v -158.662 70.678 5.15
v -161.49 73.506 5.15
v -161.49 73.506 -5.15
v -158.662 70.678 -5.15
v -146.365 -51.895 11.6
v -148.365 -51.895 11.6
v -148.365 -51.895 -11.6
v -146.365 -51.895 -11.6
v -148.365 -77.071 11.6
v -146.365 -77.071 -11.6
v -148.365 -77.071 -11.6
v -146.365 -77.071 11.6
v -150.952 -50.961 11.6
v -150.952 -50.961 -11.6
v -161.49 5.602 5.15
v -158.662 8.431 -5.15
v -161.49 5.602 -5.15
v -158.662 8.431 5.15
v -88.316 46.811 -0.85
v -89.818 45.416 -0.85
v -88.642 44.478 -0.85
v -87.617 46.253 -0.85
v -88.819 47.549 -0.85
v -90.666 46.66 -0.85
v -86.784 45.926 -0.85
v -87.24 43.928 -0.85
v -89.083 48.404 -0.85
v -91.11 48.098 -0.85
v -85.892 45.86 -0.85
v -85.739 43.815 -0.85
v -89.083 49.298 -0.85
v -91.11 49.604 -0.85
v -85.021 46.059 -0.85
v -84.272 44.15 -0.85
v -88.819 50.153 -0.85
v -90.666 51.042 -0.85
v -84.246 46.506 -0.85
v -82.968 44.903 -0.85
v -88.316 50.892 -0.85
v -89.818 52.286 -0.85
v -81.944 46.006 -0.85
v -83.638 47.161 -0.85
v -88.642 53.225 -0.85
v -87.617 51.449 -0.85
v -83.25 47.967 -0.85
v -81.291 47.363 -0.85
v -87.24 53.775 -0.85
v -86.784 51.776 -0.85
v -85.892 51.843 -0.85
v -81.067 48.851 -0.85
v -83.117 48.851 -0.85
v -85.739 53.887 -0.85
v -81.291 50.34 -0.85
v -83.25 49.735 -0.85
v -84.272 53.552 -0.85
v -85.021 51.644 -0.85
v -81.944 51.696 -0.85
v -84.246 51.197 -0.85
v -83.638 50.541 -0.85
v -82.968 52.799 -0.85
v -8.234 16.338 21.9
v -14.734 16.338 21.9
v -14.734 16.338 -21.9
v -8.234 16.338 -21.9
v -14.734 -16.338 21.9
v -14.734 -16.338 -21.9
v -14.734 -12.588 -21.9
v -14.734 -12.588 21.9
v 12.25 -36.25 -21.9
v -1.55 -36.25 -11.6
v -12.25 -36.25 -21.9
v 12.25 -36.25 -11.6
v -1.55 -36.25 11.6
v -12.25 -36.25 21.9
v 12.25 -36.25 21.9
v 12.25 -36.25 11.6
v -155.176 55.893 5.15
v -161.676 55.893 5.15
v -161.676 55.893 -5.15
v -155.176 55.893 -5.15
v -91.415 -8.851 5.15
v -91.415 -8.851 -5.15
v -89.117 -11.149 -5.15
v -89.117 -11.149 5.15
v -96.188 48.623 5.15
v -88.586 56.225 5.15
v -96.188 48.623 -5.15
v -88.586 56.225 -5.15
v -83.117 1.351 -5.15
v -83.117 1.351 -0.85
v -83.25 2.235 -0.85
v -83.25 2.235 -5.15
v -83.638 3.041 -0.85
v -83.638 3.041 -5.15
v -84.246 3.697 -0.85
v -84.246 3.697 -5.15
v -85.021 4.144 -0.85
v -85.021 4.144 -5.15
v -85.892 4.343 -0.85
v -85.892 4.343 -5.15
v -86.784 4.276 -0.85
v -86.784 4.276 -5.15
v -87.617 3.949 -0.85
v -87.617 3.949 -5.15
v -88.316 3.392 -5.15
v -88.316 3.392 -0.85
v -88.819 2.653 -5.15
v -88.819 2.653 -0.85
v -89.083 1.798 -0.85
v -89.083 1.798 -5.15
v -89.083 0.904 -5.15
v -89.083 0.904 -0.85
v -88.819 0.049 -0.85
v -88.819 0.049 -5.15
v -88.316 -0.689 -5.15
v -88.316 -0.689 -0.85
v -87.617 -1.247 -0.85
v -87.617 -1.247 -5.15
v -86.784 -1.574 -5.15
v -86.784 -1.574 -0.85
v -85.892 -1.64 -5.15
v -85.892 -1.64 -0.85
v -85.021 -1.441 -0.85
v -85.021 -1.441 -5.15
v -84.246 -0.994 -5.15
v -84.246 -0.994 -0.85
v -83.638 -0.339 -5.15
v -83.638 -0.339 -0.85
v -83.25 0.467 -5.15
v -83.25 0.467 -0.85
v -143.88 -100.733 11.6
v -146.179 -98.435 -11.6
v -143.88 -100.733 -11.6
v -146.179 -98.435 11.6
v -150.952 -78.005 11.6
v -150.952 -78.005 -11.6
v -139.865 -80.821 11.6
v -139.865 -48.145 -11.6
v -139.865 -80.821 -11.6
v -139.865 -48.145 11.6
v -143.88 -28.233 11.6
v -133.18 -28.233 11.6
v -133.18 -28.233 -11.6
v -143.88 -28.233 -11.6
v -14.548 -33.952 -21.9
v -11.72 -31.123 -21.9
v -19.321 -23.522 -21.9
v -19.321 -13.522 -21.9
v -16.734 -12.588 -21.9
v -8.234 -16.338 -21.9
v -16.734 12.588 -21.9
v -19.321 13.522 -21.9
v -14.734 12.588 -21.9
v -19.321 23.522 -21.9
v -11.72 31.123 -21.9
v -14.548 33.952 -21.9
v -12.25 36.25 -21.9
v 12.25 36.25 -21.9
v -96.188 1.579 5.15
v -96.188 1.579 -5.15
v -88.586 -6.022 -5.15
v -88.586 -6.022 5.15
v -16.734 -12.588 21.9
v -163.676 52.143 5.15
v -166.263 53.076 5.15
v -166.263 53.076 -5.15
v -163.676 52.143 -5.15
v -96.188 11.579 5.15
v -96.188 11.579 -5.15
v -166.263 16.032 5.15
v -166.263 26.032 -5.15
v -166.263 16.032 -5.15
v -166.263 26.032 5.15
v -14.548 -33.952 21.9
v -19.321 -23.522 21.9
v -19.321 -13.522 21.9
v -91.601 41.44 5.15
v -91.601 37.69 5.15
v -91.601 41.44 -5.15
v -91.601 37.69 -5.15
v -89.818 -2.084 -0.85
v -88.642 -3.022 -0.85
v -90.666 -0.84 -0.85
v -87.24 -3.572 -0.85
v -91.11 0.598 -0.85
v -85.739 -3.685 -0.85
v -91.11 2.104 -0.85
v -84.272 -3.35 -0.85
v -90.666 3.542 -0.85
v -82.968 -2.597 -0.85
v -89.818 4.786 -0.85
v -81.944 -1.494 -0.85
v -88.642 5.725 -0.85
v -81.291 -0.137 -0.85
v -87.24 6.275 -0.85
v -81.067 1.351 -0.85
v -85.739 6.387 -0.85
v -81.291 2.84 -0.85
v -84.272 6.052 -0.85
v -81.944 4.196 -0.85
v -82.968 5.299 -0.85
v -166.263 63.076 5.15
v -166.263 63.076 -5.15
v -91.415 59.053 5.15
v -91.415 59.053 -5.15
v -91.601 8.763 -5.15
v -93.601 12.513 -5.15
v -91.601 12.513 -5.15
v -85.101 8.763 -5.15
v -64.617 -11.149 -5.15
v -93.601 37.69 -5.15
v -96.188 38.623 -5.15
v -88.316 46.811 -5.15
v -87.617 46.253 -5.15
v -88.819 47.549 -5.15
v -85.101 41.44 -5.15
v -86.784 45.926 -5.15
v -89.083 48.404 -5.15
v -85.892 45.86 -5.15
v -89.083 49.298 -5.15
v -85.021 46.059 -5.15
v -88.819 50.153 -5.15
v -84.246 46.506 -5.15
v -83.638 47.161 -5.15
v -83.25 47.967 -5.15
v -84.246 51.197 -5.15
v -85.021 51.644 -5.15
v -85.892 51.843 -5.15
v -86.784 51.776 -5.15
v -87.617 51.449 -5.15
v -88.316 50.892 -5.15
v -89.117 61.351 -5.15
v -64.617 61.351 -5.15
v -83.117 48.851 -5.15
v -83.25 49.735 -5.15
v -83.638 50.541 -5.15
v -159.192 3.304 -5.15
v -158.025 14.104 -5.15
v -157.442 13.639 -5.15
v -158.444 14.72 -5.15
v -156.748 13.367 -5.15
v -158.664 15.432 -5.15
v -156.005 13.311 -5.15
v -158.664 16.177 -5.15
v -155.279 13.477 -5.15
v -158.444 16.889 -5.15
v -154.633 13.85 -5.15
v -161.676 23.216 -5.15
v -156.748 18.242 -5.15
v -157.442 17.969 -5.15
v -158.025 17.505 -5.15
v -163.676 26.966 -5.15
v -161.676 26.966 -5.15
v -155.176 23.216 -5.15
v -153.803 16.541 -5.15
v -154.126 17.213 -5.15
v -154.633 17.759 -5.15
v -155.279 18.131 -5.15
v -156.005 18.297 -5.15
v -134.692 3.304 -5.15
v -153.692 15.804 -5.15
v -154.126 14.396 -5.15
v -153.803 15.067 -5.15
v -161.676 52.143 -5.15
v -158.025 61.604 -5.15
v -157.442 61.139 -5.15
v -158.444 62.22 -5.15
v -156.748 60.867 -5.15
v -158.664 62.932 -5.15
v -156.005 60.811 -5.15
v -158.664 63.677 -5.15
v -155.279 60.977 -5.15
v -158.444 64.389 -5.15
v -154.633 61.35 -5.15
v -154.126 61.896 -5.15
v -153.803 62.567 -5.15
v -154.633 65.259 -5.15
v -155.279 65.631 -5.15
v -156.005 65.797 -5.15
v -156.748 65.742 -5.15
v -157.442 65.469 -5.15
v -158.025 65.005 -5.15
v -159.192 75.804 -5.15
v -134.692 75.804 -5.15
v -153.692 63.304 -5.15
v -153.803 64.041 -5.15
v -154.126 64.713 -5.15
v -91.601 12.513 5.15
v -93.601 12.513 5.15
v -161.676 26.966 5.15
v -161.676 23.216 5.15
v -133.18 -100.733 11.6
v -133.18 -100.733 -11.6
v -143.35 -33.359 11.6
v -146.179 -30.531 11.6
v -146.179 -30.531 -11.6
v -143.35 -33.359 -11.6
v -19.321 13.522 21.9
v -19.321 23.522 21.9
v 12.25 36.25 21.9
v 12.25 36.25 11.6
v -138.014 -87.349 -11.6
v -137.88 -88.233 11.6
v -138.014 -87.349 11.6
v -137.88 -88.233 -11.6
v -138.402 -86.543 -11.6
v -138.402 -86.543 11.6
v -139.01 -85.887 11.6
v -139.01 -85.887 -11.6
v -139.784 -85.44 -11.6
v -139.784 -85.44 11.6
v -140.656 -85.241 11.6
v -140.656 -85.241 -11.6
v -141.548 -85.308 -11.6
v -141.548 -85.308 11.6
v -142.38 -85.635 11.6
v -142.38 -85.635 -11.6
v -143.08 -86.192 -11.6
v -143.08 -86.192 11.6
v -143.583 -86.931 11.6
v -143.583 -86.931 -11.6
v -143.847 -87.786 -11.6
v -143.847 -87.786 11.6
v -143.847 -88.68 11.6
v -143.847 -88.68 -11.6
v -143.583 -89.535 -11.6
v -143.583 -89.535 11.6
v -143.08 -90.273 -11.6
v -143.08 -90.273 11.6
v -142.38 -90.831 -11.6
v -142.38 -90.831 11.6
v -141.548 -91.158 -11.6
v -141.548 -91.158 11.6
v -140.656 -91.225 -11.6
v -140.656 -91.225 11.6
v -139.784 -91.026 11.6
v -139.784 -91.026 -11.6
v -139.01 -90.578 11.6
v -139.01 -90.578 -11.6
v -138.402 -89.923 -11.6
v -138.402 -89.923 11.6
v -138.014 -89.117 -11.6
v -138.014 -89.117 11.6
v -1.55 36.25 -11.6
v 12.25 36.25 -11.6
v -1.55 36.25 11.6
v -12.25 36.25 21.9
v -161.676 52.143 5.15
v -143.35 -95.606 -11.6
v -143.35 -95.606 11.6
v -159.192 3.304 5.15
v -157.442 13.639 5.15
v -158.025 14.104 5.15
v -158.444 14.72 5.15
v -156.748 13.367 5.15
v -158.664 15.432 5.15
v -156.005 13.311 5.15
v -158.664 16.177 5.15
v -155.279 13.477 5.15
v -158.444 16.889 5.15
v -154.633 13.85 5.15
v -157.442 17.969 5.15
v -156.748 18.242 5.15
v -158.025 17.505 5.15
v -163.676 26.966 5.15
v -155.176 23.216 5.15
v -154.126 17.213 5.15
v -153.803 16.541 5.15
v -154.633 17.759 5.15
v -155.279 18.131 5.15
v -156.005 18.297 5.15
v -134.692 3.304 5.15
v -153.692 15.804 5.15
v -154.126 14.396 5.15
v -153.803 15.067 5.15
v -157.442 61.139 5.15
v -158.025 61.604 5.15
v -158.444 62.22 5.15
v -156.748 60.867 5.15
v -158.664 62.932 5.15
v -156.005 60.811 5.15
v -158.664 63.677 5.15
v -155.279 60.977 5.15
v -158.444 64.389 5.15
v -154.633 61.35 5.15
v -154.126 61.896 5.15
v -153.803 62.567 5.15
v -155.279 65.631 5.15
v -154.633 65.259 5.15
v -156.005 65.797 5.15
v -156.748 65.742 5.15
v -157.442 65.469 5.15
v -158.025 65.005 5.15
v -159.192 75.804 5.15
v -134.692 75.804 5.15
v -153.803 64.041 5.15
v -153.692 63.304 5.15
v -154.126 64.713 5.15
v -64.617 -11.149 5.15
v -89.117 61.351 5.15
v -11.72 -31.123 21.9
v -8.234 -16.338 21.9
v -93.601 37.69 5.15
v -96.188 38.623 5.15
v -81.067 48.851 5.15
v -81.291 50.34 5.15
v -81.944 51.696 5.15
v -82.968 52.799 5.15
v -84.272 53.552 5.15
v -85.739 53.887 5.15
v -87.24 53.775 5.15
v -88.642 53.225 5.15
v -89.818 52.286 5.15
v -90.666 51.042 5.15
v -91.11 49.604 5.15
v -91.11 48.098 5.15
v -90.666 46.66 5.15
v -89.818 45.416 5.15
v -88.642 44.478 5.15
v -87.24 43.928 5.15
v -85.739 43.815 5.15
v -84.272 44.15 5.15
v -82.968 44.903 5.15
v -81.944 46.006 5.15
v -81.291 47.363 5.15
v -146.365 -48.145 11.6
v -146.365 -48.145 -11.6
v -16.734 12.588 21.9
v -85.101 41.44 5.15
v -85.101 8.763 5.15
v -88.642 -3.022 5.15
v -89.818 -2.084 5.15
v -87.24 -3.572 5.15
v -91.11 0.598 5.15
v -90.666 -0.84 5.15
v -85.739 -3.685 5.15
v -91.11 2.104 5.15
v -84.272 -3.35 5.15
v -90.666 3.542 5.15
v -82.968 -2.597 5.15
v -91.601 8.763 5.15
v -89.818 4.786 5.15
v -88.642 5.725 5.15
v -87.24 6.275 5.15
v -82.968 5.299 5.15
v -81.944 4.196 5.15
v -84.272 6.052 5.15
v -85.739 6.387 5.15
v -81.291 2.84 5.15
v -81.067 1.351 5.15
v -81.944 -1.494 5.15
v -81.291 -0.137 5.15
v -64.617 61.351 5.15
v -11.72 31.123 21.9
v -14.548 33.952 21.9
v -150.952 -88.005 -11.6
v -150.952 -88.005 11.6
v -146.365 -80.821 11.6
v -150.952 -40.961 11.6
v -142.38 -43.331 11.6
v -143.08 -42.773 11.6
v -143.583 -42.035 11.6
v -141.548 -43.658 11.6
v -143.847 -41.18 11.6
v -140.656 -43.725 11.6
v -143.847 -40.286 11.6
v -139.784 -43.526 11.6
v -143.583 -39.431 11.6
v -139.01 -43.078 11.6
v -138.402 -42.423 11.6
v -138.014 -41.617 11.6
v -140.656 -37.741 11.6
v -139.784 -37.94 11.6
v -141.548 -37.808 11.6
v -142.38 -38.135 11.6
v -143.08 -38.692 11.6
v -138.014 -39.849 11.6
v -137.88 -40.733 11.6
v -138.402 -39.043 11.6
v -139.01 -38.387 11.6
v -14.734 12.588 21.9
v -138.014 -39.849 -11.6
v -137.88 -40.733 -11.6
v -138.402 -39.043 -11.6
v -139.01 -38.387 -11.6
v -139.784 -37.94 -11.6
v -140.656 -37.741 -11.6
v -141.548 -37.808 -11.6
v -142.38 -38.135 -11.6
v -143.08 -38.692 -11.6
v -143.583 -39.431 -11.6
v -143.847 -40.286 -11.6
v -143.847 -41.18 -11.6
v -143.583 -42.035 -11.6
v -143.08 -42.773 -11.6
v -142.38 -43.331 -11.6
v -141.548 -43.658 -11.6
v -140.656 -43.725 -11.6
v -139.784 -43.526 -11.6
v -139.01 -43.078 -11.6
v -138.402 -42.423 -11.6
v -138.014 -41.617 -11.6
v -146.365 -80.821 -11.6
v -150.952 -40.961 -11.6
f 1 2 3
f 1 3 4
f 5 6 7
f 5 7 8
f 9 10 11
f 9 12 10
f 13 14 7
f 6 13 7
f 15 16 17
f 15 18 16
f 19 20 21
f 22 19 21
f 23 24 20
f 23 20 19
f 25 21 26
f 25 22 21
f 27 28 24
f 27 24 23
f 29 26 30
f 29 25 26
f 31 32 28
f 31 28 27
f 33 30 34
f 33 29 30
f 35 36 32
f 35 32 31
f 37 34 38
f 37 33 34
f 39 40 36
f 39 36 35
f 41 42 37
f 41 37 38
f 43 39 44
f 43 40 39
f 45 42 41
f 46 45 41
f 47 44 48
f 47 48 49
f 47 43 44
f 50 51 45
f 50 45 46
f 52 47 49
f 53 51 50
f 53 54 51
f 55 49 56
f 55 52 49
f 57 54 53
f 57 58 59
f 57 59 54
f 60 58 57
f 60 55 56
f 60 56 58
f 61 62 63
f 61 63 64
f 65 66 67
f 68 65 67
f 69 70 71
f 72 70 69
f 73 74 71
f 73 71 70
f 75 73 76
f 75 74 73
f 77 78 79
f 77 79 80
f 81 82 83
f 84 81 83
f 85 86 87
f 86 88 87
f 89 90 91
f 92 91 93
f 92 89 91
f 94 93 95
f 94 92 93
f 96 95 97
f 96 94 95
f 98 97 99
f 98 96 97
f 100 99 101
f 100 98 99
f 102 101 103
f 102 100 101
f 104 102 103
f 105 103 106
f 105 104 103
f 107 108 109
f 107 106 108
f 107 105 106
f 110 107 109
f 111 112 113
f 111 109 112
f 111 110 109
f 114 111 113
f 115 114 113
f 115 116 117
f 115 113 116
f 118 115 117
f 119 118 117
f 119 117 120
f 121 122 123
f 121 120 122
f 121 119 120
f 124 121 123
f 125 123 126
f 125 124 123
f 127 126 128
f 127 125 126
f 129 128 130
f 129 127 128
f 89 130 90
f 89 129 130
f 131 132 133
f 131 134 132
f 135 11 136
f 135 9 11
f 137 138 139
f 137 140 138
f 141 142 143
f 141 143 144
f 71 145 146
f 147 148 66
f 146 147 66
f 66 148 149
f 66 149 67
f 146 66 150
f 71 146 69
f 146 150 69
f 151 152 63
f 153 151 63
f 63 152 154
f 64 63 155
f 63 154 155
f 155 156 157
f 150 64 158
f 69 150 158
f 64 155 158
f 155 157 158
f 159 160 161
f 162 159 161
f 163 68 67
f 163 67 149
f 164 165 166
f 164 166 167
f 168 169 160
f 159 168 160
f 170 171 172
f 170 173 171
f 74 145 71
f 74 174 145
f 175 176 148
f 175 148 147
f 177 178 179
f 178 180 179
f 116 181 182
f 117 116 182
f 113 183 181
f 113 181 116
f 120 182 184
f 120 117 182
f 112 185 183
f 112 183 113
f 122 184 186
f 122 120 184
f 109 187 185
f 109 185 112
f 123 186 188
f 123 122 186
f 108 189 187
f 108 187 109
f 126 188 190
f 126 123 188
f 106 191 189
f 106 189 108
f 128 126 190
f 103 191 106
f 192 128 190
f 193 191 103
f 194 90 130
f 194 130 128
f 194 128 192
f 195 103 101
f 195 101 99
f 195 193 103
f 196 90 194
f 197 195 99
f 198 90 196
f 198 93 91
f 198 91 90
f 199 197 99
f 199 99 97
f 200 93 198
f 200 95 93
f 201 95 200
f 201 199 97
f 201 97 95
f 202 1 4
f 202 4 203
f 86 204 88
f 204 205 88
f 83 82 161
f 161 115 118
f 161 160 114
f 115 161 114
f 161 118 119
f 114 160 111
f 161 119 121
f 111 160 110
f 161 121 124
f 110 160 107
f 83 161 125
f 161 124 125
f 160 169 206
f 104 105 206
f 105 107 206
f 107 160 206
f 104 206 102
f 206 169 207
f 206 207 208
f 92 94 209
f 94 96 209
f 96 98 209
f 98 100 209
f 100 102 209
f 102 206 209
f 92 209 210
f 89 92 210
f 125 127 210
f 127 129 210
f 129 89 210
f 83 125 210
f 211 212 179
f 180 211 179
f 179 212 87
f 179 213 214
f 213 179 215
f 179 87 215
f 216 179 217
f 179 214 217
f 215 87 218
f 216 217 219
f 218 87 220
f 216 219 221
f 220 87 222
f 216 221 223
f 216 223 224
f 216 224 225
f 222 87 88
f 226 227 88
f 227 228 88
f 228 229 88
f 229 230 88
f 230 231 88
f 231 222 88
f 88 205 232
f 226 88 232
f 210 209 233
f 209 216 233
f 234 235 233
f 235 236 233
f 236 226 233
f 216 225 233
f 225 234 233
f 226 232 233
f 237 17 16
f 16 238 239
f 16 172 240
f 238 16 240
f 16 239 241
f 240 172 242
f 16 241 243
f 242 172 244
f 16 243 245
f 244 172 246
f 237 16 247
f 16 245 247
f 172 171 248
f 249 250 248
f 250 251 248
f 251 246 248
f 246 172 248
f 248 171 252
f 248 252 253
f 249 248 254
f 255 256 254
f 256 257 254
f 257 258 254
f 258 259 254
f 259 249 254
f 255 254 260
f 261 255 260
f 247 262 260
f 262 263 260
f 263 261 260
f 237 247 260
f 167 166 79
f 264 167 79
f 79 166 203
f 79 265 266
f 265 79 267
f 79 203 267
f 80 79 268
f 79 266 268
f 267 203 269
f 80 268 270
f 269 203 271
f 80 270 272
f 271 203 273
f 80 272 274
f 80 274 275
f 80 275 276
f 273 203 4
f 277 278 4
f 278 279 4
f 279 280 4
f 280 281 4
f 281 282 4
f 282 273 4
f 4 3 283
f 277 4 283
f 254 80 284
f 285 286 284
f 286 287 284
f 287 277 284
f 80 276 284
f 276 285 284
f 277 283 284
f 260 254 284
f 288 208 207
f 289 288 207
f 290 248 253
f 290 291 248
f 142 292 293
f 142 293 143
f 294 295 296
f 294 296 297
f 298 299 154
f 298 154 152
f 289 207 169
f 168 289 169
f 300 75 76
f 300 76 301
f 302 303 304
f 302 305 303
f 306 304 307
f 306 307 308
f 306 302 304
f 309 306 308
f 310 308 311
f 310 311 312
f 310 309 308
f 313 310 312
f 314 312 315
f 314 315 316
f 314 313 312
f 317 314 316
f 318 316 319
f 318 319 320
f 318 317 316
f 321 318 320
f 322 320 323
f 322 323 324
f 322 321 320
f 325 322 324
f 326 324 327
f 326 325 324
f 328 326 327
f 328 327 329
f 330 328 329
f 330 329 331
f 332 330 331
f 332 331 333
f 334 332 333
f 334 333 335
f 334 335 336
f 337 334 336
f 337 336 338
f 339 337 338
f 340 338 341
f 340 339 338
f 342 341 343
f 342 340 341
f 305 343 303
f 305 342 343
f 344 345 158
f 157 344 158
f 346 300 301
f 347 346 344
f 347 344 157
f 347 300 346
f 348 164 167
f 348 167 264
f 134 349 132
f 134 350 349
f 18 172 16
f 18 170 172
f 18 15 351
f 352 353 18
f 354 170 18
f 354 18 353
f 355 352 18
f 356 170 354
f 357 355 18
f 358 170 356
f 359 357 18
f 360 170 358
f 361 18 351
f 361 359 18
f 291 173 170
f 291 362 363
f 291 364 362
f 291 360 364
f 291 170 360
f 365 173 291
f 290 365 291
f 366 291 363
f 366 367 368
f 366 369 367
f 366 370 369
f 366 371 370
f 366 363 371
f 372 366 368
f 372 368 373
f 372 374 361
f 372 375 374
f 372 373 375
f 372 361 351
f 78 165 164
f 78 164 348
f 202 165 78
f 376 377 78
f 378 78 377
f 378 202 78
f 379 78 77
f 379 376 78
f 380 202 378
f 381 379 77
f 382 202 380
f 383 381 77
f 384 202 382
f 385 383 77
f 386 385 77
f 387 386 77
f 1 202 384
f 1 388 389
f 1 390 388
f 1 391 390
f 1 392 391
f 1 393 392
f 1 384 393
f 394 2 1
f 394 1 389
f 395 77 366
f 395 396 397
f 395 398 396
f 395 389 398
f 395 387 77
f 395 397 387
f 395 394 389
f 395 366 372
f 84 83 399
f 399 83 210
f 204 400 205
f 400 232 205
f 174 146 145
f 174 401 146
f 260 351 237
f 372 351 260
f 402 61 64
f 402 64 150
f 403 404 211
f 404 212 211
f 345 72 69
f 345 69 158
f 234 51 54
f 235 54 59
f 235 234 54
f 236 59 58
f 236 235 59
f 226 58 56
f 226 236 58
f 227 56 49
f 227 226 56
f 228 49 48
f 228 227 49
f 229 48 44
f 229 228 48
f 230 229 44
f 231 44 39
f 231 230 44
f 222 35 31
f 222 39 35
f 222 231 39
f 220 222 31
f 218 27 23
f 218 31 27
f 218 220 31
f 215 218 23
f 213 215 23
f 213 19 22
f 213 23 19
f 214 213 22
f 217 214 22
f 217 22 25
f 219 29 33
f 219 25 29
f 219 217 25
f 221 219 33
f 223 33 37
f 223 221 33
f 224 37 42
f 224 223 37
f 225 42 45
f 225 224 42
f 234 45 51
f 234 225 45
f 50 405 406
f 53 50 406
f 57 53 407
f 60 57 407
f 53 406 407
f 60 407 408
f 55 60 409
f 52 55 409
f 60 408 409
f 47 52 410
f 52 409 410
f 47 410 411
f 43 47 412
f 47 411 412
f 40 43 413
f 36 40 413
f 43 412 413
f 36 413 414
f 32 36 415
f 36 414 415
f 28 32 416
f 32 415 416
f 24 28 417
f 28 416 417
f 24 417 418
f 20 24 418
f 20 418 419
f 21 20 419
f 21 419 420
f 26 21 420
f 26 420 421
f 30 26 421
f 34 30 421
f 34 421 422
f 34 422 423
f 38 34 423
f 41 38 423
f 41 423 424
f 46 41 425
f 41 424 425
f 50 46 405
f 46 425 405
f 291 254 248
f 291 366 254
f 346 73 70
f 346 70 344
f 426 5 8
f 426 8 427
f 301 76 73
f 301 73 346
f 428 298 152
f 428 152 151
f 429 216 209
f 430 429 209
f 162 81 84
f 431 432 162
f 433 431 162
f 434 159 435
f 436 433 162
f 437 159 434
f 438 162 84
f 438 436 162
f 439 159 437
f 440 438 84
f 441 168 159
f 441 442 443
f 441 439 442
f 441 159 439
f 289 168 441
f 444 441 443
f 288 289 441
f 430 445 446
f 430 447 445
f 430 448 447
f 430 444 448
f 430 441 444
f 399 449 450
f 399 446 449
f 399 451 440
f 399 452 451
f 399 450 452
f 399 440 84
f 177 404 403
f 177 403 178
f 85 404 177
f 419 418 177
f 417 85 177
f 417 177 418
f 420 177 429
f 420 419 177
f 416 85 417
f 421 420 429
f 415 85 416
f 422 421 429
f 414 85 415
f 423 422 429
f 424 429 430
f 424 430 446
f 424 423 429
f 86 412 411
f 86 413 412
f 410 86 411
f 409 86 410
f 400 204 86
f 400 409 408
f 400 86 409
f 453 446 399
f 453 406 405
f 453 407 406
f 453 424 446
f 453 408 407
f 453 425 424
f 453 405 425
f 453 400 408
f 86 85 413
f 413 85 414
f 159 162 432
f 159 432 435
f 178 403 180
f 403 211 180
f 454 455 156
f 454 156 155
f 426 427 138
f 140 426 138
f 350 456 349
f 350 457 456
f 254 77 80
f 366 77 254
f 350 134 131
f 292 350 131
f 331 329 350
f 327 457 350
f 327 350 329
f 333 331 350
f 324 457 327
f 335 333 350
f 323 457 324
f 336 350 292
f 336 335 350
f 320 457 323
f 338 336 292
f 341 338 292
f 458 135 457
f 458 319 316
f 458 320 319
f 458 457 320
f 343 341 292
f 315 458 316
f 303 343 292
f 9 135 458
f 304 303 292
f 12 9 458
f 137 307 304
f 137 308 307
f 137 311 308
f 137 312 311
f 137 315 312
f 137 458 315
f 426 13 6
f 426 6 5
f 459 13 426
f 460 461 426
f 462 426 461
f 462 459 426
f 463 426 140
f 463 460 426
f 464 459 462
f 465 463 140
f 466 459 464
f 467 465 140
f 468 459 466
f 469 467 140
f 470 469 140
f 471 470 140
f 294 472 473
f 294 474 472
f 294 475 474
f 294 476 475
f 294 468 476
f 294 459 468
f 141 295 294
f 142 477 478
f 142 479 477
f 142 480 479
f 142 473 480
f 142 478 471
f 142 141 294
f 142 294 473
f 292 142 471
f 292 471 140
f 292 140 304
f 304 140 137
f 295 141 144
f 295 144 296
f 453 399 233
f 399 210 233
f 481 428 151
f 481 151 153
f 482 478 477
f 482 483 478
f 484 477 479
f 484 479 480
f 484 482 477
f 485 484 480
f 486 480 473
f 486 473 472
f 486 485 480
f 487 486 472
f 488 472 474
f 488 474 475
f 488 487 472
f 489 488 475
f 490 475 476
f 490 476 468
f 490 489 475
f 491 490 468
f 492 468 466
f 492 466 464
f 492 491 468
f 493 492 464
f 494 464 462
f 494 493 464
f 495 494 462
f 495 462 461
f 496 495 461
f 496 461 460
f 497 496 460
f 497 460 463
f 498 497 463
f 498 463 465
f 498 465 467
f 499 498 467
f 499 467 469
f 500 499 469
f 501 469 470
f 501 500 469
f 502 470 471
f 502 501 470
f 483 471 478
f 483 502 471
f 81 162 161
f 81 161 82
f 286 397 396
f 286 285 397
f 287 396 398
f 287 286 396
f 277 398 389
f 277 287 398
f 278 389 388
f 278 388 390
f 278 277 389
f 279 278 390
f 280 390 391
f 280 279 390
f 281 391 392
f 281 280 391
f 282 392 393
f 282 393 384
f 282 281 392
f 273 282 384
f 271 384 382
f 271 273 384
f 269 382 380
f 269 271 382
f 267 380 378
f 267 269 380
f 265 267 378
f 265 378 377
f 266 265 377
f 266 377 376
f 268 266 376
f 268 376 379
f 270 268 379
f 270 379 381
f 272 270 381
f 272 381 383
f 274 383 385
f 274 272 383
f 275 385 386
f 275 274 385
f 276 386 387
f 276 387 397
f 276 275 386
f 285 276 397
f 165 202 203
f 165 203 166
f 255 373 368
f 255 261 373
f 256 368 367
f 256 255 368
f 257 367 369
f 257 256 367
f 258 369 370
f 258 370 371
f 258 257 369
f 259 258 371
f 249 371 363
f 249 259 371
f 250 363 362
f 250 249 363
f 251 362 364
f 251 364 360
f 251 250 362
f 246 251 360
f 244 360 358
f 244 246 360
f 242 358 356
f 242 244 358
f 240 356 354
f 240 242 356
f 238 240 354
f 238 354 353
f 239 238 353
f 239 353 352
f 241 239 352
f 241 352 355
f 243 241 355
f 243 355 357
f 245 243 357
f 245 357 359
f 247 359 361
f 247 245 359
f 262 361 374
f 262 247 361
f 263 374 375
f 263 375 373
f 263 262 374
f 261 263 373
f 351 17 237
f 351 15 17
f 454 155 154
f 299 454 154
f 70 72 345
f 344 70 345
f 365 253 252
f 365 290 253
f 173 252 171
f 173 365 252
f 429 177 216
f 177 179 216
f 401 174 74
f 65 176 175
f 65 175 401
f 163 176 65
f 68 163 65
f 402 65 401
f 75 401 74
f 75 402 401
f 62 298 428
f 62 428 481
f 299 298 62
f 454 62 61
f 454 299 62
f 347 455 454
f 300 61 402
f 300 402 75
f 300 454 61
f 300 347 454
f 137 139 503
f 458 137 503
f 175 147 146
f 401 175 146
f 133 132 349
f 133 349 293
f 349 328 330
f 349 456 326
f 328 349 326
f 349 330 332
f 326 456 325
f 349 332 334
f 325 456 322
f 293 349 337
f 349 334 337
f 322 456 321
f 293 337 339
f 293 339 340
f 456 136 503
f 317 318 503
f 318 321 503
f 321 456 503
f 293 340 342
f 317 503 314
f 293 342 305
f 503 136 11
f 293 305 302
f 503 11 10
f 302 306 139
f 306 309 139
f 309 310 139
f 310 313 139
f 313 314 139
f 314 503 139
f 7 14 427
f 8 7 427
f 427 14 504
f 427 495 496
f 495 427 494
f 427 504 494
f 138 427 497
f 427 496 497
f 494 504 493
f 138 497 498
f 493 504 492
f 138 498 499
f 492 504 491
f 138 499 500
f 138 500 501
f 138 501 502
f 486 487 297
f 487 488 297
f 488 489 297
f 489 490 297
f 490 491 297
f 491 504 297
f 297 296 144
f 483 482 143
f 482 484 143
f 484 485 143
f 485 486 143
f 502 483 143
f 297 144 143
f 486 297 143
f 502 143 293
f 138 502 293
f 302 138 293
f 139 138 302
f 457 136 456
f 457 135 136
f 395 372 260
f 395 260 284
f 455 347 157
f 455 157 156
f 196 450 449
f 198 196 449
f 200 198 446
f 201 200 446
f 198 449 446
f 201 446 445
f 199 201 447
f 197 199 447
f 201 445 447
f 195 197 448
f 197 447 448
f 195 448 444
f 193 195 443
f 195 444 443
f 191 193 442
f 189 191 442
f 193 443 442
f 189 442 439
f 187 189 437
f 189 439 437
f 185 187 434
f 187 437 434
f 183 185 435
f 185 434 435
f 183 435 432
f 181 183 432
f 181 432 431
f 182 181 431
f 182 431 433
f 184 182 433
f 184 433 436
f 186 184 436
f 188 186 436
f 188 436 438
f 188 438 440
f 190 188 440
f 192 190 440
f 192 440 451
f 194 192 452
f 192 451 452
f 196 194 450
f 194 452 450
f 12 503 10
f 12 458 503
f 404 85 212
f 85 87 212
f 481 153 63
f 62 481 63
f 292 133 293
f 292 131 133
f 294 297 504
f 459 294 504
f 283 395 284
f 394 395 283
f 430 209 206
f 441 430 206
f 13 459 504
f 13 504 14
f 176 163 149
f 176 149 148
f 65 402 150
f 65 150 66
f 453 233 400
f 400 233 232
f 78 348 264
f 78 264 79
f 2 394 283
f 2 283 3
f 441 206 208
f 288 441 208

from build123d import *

# Parameters (mm, degrees)
F1_DEPTH = 21.9
F2_W     = 72.5
F2_H     = 23.2
F3_DEPTH = 13.8
F4_R     = 3
F4_R_2   = 2.5
F5_DEPTH = 5.15
F6_R     = 3
F7_DEPTH = 11.6
F8_R     = 5.05
F9_DEPTH = 6


with BuildPart() as f1:
    # F0 (on Top) → F1 (new body, symmetric)
    with BuildSketch(Plane.XY):
        Polygon((-12.25, -36.25), (12.25, -36.25), (12.25, 36.25), (-12.25, 36.25), (-14.548097, 33.951903), (-11.71967, 31.123476), (-19.321068, 23.522078), (-19.321068, 13.522078), (-16.734427, 12.588382), (-14.734427, 12.588382), (-14.734427, 13.322519), (-14.734427, 16.338382), (-8.234427, 16.338382), (-8.234427, 0), (-8.234427, -16.338382), (-14.734427, -16.338382), (-14.734427, -13.322519), (-14.734427, -12.588382), (-16.734427, -12.588382), (-19.321068, -13.522078), (-19.321068, -23.522078), (-11.71967, -31.123476), (-14.548097, -33.951903), align=None)
    extrude(amount=F1_DEPTH, both=True)

    # F2 (on face) → F3 (cut)
    with BuildSketch(Plane.YZ.offset(12.25)):
        Rectangle(F2_W, F2_H)
    extrude(amount=-F3_DEPTH, mode=Mode.SUBTRACT)


with BuildPart() as f5:
    # F4 (on Top) → F5 (new body, symmetric)
    with BuildSketch(Plane.XY):
        Polygon((-89.116569, -11.14886), (-64.616569, -11.14886), (-64.616569, 61.35114), (-89.116569, 61.35114), (-91.414667, 59.053043), (-88.586239, 56.224616), (-96.187637, 48.623218), (-96.187637, 38.623218), (-93.600996, 37.689523), (-91.600996, 37.689523), (-91.600996, 38.423659), (-91.600996, 41.439523), (-85.100996, 41.439523), (-85.100996, 25.10114), (-85.100996, 8.762758), (-91.600996, 8.762758), (-91.600996, 11.778621), (-91.600996, 12.512758), (-93.600996, 12.512758), (-96.187637, 11.579062), (-96.187637, 1.579062), (-88.586239, -6.022336), (-91.414667, -8.850763), align=None)
        with Locations((-86.116569, 1.35114)):
            Circle(F4_R, mode=Mode.SUBTRACT)
        with Locations((-86.116569, 48.85114)):
            Circle(F4_R, mode=Mode.SUBTRACT)
        Polygon((-159.191932, 3.304238), (-134.691932, 3.304238), (-134.691932, 75.804238), (-159.191932, 75.804238), (-161.490029, 73.506141), (-158.661602, 70.677714), (-166.263, 63.076316), (-166.263, 53.076316), (-163.676359, 52.142621), (-161.676359, 52.142621), (-161.676359, 52.876758), (-161.676359, 55.892621), (-155.176359, 55.892621), (-155.176359, 39.554238), (-155.176359, 23.215856), (-161.676359, 23.215856), (-161.676359, 26.231719), (-161.676359, 26.965856), (-163.676359, 26.965856), (-166.263, 26.032161), (-166.263, 16.032161), (-158.661602, 8.430763), (-161.490029, 5.602336), align=None)
        with Locations((-156.191932, 15.804238)):
            Circle(F4_R_2, mode=Mode.SUBTRACT)
        with Locations((-156.191932, 63.304238)):
            Circle(F4_R_2, mode=Mode.SUBTRACT)
    extrude(amount=F5_DEPTH, both=True)

    # F8 (on face) → F9 (cut)
    with BuildSketch(Plane.XY.offset(5.15)):
        with Locations((-86.116569, 48.85114)):
            Circle(F8_R)
        with Locations((-86.116569, 1.35114)):
            Circle(F8_R)
    extrude(amount=-F9_DEPTH, mode=Mode.SUBTRACT)


with BuildPart() as f7:
    # F6 (on Top) → F7 (new body, symmetric)
    with BuildSketch(Plane.XY):
        Polygon((-143.880438, -100.732935), (-133.180438, -100.732935), (-133.180438, -28.232935), (-143.880438, -28.232935), (-146.178535, -30.531032), (-143.350108, -33.359459), (-150.951506, -40.960857), (-150.951506, -50.960857), (-148.364865, -51.894552), (-146.364865, -51.894552), (-146.364865, -51.160416), (-146.364865, -48.144552), (-139.864865, -48.144552), (-139.864865, -64.482935), (-139.864865, -80.821317), (-146.364865, -80.821317), (-146.364865, -77.805454), (-146.364865, -77.071317), (-148.364865, -77.071317), (-150.951506, -78.005013), (-150.951506, -88.005013), (-143.350108, -95.60641), (-146.178535, -98.434838), align=None)
        with Locations((-140.880438, -88.232935)):
            Circle(F6_R, mode=Mode.SUBTRACT)
        with Locations((-140.880438, -40.732935)):
            Circle(F6_R, mode=Mode.SUBTRACT)
    extrude(amount=F7_DEPTH, both=True)


solid = Compound([f1.part, f5.part, f7.part])
